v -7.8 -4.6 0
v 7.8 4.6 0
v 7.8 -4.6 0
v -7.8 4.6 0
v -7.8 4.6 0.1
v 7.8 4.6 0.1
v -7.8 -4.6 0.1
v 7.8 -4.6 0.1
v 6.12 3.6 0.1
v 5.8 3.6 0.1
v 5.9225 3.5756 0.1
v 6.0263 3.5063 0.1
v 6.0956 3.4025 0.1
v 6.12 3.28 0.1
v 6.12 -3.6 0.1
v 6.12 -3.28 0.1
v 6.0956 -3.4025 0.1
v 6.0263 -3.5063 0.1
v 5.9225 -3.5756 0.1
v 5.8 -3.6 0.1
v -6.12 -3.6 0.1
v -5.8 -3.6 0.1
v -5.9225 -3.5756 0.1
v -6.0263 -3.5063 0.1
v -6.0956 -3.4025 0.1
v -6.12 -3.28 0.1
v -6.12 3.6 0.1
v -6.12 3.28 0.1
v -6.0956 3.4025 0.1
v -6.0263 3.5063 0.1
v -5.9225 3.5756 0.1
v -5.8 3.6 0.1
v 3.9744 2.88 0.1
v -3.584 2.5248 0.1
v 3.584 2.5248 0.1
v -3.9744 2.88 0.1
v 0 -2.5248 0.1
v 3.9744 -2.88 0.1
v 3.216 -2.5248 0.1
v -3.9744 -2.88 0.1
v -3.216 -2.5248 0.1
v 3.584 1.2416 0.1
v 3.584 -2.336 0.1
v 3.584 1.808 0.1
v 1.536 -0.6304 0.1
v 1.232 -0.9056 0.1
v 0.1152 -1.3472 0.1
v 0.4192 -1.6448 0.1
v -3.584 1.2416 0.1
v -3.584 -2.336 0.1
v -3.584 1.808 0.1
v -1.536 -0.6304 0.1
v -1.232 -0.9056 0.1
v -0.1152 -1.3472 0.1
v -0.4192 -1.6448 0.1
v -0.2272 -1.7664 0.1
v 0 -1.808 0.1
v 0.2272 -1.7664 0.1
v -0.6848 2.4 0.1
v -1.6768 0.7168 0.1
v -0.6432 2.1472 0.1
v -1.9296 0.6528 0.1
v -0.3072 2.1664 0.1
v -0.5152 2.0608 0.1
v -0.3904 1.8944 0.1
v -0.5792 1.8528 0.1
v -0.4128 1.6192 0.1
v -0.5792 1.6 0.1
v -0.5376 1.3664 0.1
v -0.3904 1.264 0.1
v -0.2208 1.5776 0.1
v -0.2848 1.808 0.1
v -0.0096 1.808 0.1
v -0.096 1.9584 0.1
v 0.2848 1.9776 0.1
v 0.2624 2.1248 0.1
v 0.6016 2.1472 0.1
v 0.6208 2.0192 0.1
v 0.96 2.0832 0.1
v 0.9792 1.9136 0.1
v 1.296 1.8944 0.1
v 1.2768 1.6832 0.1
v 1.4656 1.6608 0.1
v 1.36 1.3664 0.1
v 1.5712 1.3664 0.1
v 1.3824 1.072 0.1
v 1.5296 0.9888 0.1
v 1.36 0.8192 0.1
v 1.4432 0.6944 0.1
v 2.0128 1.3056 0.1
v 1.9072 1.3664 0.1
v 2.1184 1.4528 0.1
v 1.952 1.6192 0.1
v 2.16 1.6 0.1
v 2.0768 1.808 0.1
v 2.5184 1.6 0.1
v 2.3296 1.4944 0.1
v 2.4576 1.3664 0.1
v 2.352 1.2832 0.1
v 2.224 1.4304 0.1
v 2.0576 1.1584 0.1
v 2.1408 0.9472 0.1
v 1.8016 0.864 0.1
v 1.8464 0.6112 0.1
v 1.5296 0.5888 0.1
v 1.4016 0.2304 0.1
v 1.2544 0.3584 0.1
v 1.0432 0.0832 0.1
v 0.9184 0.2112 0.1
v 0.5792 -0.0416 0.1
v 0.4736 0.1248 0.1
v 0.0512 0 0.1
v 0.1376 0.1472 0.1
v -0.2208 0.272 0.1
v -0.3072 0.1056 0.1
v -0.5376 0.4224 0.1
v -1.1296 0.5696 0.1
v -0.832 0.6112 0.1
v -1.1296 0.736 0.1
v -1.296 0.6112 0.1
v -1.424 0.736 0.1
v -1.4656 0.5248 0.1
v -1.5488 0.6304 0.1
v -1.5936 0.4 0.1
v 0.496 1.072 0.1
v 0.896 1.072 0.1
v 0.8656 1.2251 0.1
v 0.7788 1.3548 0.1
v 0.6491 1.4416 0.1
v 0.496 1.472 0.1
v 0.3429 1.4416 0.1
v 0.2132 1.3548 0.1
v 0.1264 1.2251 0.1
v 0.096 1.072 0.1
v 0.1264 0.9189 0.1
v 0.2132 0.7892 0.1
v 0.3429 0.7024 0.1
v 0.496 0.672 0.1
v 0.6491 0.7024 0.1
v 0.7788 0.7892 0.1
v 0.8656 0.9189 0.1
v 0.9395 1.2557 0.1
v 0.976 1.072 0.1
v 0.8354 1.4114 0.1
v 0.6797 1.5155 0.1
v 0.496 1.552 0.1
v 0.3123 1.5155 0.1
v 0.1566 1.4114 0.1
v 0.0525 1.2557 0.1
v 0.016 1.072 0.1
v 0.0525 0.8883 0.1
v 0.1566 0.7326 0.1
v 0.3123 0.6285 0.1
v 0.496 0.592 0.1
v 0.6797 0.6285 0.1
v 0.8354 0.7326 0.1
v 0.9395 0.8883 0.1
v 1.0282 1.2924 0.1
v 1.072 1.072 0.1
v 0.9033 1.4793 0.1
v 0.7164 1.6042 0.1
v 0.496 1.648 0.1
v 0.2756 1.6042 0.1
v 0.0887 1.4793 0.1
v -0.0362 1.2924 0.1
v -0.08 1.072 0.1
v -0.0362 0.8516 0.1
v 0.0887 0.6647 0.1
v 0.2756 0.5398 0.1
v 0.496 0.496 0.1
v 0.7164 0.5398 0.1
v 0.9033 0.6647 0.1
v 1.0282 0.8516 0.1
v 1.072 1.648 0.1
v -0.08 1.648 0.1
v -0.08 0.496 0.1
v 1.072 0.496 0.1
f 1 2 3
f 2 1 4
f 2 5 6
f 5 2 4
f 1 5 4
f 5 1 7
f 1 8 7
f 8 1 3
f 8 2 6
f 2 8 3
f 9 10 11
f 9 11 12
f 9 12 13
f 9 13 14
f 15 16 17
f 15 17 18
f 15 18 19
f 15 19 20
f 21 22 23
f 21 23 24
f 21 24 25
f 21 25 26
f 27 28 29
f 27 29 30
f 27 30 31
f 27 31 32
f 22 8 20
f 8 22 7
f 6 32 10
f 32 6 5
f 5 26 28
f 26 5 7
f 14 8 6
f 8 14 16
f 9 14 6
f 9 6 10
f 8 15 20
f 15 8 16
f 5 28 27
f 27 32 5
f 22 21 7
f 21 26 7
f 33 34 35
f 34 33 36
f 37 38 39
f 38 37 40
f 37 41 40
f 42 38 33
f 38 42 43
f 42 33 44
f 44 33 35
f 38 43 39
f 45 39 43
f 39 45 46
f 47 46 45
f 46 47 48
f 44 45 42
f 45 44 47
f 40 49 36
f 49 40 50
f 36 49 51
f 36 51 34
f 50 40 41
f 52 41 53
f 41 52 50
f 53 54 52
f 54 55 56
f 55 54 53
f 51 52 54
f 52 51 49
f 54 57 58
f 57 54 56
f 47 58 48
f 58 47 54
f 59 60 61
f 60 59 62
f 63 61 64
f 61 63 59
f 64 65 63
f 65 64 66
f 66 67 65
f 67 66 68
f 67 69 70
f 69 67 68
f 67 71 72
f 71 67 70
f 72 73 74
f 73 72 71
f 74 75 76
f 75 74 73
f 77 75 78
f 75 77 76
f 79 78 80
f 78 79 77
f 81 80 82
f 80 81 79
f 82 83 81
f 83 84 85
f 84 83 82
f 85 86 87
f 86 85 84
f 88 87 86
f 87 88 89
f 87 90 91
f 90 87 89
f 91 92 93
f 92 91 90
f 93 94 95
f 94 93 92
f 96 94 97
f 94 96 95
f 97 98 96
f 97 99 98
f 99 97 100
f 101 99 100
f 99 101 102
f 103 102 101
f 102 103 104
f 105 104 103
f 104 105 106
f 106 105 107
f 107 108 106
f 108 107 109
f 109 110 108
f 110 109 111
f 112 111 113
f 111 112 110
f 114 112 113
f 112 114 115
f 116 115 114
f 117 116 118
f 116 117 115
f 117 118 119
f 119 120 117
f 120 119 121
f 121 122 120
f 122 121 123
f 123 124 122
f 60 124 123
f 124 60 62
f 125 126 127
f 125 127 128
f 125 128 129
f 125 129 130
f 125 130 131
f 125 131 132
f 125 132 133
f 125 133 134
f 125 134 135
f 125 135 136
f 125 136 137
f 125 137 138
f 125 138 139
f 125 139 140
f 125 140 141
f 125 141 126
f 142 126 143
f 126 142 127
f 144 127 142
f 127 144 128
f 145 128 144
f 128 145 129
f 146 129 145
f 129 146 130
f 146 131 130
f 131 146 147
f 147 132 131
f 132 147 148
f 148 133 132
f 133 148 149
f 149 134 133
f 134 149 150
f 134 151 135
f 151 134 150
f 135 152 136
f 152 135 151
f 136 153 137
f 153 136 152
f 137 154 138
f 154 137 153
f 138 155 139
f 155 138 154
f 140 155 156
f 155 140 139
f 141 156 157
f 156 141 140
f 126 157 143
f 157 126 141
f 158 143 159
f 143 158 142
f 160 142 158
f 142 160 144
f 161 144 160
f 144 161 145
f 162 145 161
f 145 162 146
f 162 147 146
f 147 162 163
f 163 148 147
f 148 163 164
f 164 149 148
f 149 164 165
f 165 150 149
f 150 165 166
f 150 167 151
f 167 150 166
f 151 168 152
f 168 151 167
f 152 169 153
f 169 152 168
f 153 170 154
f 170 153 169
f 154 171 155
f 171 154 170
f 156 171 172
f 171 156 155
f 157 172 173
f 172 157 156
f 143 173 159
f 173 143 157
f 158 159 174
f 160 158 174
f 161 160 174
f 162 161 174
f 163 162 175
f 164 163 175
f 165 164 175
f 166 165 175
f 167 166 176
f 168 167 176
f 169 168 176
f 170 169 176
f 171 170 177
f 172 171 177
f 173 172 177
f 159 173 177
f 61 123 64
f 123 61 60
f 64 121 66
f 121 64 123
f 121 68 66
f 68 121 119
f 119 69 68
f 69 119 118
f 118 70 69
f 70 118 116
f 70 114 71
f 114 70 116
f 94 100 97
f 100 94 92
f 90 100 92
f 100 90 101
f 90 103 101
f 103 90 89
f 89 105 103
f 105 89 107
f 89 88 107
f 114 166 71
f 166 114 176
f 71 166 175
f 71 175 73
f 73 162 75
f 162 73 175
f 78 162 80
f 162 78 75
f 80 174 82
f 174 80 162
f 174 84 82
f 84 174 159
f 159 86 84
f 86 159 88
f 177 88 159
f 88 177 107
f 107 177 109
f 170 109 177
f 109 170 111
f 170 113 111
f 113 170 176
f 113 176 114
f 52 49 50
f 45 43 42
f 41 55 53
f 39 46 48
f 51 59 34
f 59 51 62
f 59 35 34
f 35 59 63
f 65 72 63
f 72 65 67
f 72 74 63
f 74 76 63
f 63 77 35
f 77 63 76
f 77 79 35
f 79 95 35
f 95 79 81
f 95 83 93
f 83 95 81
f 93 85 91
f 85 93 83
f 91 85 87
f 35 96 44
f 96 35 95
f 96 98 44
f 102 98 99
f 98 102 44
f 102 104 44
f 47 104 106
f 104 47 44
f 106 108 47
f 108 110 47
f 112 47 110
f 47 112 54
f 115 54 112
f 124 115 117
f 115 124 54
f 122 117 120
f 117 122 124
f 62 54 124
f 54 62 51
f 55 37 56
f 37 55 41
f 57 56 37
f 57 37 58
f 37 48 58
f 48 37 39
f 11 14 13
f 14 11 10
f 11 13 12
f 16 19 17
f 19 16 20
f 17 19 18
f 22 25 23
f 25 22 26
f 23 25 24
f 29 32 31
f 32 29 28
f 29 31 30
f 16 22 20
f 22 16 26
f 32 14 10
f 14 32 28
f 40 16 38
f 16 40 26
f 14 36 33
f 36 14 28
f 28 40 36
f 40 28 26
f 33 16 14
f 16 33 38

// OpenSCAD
// file: ../p/4-4ring5.scad
use <../lib.scad>
function ldraw_lib__4_4ring5() = [
// 0 Ring  5 x 1.0
// 0 Name: 4-4ring5.dat
// 0 Author: Mark Kennedy [mkennedy]
// 0 !LDRAW_ORG Primitive UPDATE 2025-01
// 0 !LICENSE Licensed under CC BY 4.0 : see CAreadme.txt
// 
// 0 BFC CERTIFY CCW
  [0,"BFC","CERTIFY"],
  [0,"BFC","CCW"],
// 
// 0 !HISTORY 2001-10-23 [pneaster] resequenced quads, corrected winding.
// 0 !HISTORY 2001-12-29 [pneaster] Added BFC.
// 0 !HISTORY 2002-04-25 [PTadmin] Official Update 2002-02
// 0 !HISTORY 2007-06-24 [PTadmin] Header formatted for Contributor Agreement
// 0 !HISTORY 2008-07-01 [PTadmin] Official Update 2008-01
// 0 !HISTORY 2012-02-16 [Philo] Changed to CCW
// 0 !HISTORY 2012-03-30 [PTadmin] Official Update 2012-01
// 0 !HISTORY 2024-12-30 [MagFors] Recreated using PrimGen
// 0 !HISTORY 2025-01-20 [OrionP] Official Update 2025-01
// 
// 4 16 6 0 0 5.5434 0 2.2962 4.6195 0 1.9135 5 0 0
  [4,16,6,0,0,5.5434,0,2.2962,4.6195,0,1.9135,5,0,0],
// 4 16 5.5434 0 2.2962 4.2426 0 4.2426 3.5355 0 3.5355 4.6195 0 1.9135
  [4,16,5.5434,0,2.2962,4.2426,0,4.2426,3.5355,0,3.5355,4.6195,0,1.9135],
// 4 16 4.2426 0 4.2426 2.2962 0 5.5434 1.9135 0 4.6195 3.5355 0 3.5355
  [4,16,4.2426,0,4.2426,2.2962,0,5.5434,1.9135,0,4.6195,3.5355,0,3.5355],
// 4 16 2.2962 0 5.5434 0 0 6 0 0 5 1.9135 0 4.6195
  [4,16,2.2962,0,5.5434,0,0,6,0,0,5,1.9135,0,4.6195],
// 4 16 0 0 6 -2.2962 0 5.5434 -1.9135 0 4.6195 0 0 5
  [4,16,0,0,6,-2.2962,0,5.5434,-1.9135,0,4.6195,0,0,5],
// 4 16 -2.2962 0 5.5434 -4.2426 0 4.2426 -3.5355 0 3.5355 -1.9135 0 4.6195
  [4,16,-2.2962,0,5.5434,-4.2426,0,4.2426,-3.5355,0,3.5355,-1.9135,0,4.6195],
// 4 16 -4.2426 0 4.2426 -5.5434 0 2.2962 -4.6195 0 1.9135 -3.5355 0 3.5355
  [4,16,-4.2426,0,4.2426,-5.5434,0,2.2962,-4.6195,0,1.9135,-3.5355,0,3.5355],
// 4 16 -5.5434 0 2.2962 -6 0 0 -5 0 0 -4.6195 0 1.9135
  [4,16,-5.5434,0,2.2962,-6,0,0,-5,0,0,-4.6195,0,1.9135],
// 4 16 -6 0 0 -5.5434 0 -2.2962 -4.6195 0 -1.9135 -5 0 0
  [4,16,-6,0,0,-5.5434,0,-2.2962,-4.6195,0,-1.9135,-5,0,0],
// 4 16 -5.5434 0 -2.2962 -4.2426 0 -4.2426 -3.5355 0 -3.5355 -4.6195 0 -1.9135
  [4,16,-5.5434,0,-2.2962,-4.2426,0,-4.2426,-3.5355,0,-3.5355,-4.6195,0,-1.9135],
// 4 16 -4.2426 0 -4.2426 -2.2962 0 -5.5434 -1.9135 0 -4.6195 -3.5355 0 -3.5355
  [4,16,-4.2426,0,-4.2426,-2.2962,0,-5.5434,-1.9135,0,-4.6195,-3.5355,0,-3.5355],
// 4 16 -2.2962 0 -5.5434 0 0 -6 0 0 -5 -1.9135 0 -4.6195
  [4,16,-2.2962,0,-5.5434,0,0,-6,0,0,-5,-1.9135,0,-4.6195],
// 4 16 0 0 -6 2.2962 0 -5.5434 1.9135 0 -4.6195 0 0 -5
  [4,16,0,0,-6,2.2962,0,-5.5434,1.9135,0,-4.6195,0,0,-5],
// 4 16 2.2962 0 -5.5434 4.2426 0 -4.2426 3.5355 0 -3.5355 1.9135 0 -4.6195
  [4,16,2.2962,0,-5.5434,4.2426,0,-4.2426,3.5355,0,-3.5355,1.9135,0,-4.6195],
// 4 16 4.2426 0 -4.2426 5.5434 0 -2.2962 4.6195 0 -1.9135 3.5355 0 -3.5355
  [4,16,4.2426,0,-4.2426,5.5434,0,-2.2962,4.6195,0,-1.9135,3.5355,0,-3.5355],
// 4 16 5.5434 0 -2.2962 6 0 0 5 0 0 4.6195 0 -1.9135
  [4,16,5.5434,0,-2.2962,6,0,0,5,0,0,4.6195,0,-1.9135],
// 0 // Build by LDPartEditor (PrimGen 2.X)
];
module ldraw_lib__4_4ring5(step=0, col=false, unit=2/5, alt=false, line=0.2, solid=!$preview)
    makepoly(ldraw_lib__4_4ring5(), step=step, col=col, unit=unit, alt=alt, line=line, solid=solid);
ldraw_lib__4_4ring5(line=0.2);
// file: ../p/4-4ndis.scad
use <../lib.scad>
function ldraw_lib__4_4ndis() = [
// 0 Disc Negative 1.0
// 0 Name: 4-4ndis.dat
// 0 Author: James Jessiman
// 0 !LDRAW_ORG Primitive UPDATE 2012-01
// 0 !LICENSE Licensed under CC BY 4.0 : see CAreadme.txt
// 
// 0 BFC CERTIFY CCW
  [0,"BFC","CERTIFY"],
  [0,"BFC","CCW"],
// 
// 0 !HISTORY 2002-03-23 [sbliss] Added BFC statement; compacted code
// 0 !HISTORY 2002-04-25 [PTadmin] Official Update 2002-02
// 0 !HISTORY 2007-06-24 [PTadmin] Header formatted for Contributor Agreement
// 0 !HISTORY 2008-07-01 [PTadmin] Official Update 2008-01
// 0 !HISTORY 2012-02-16 [Philo] Changed to CCW
// 0 !HISTORY 2012-03-30 [PTadmin] Official Update 2012-01
// 
// 
// 3 16 0.9239 0 0.3827 1 0 0 1 0 1
  [3,16,0.9239,0,0.3827,1,0,0,1,0,1],
// 3 16 0.7071 0 0.7071 0.9239 0 0.3827 1 0 1
  [3,16,0.7071,0,0.7071,0.9239,0,0.3827,1,0,1],
// 3 16 0.3827 0 0.9239 0.7071 0 0.7071 1 0 1
  [3,16,0.3827,0,0.9239,0.7071,0,0.7071,1,0,1],
// 3 16 0 0 1 0.3827 0 0.9239 1 0 1
  [3,16,0,0,1,0.3827,0,0.9239,1,0,1],
// 3 16 -0.3827 0 0.9239 0 0 1 -1 0 1
  [3,16,-0.3827,0,0.9239,0,0,1,-1,0,1],
// 3 16 -0.7071 0 0.7071 -0.3827 0 0.9239 -1 0 1
  [3,16,-0.7071,0,0.7071,-0.3827,0,0.9239,-1,0,1],
// 3 16 -0.9239 0 0.3827 -0.7071 0 0.7071 -1 0 1
  [3,16,-0.9239,0,0.3827,-0.7071,0,0.7071,-1,0,1],
// 3 16 -1 0 0 -0.9239 0 0.3827 -1 0 1
  [3,16,-1,0,0,-0.9239,0,0.3827,-1,0,1],
// 3 16 -0.9239 0 -0.3827 -1 0 0 -1 0 -1
  [3,16,-0.9239,0,-0.3827,-1,0,0,-1,0,-1],
// 3 16 -0.7071 0 -0.7071 -0.9239 0 -0.3827 -1 0 -1
  [3,16,-0.7071,0,-0.7071,-0.9239,0,-0.3827,-1,0,-1],
// 3 16 -0.3827 0 -0.9239 -0.7071 0 -0.7071 -1 0 -1
  [3,16,-0.3827,0,-0.9239,-0.7071,0,-0.7071,-1,0,-1],
// 3 16 0 0 -1 -0.3827 0 -0.9239 -1 0 -1
  [3,16,0,0,-1,-0.3827,0,-0.9239,-1,0,-1],
// 3 16 0.3827 0 -0.9239 0 0 -1 1 0 -1
  [3,16,0.3827,0,-0.9239,0,0,-1,1,0,-1],
// 3 16 0.7071 0 -0.7071 0.3827 0 -0.9239 1 0 -1
  [3,16,0.7071,0,-0.7071,0.3827,0,-0.9239,1,0,-1],
// 3 16 0.9239 0 -0.3827 0.7071 0 -0.7071 1 0 -1
  [3,16,0.9239,0,-0.3827,0.7071,0,-0.7071,1,0,-1],
// 3 16 1 0 0 0.9239 0 -0.3827 1 0 -1
  [3,16,1,0,0,0.9239,0,-0.3827,1,0,-1],
];
module ldraw_lib__4_4ndis(step=0, col=false, unit=2/5, alt=false, line=0.2, solid=!$preview)
    makepoly(ldraw_lib__4_4ndis(), step=step, col=col, unit=unit, alt=alt, line=line, solid=solid);
ldraw_lib__4_4ndis(line=0.2);
// file: ../p/4-4disc.scad
use <../lib.scad>
function ldraw_lib__4_4disc() = [
// 0 Disc 1.0
// 0 Name: 4-4disc.dat
// 0 Author: James Jessiman
// 0 !LDRAW_ORG Primitive UPDATE 2002-02
// 0 !LICENSE Licensed under CC BY 4.0 : see CAreadme.txt
// 
// 0 BFC CERTIFY CCW
  [0,"BFC","CERTIFY"],
  [0,"BFC","CCW"],
// 
// 0 !HISTORY 1998-12-15 [PTadmin] Official Update 1998-10
// 0 !HISTORY 2002-03-23 [sbliss] Added BFC statement
// 0 !HISTORY 2002-04-25 [PTadmin] Official Update 2002-02
// 0 !HISTORY 2007-06-24 [PTadmin] Header formatted for Contributor Agreement
// 0 !HISTORY 2008-07-01 [PTadmin] Official Update 2008-01
// 
// 
// 3 16 0 0 0 1 0 0 0.9239 0 0.3827
  [3,16,0,0,0,1,0,0,0.9239,0,0.3827],
// 3 16 0 0 0 0.9239 0 0.3827 0.7071 0 0.7071
  [3,16,0,0,0,0.9239,0,0.3827,0.7071,0,0.7071],
// 3 16 0 0 0 0.7071 0 0.7071 0.3827 0 0.9239
  [3,16,0,0,0,0.7071,0,0.7071,0.3827,0,0.9239],
// 3 16 0 0 0 0.3827 0 0.9239 0 0 1
  [3,16,0,0,0,0.3827,0,0.9239,0,0,1],
// 3 16 0 0 0 0 0 1 -0.3827 0 0.9239
  [3,16,0,0,0,0,0,1,-0.3827,0,0.9239],
// 3 16 0 0 0 -0.3827 0 0.9239 -0.7071 0 0.7071
  [3,16,0,0,0,-0.3827,0,0.9239,-0.7071,0,0.7071],
// 3 16 0 0 0 -0.7071 0 0.7071 -0.9239 0 0.3827
  [3,16,0,0,0,-0.7071,0,0.7071,-0.9239,0,0.3827],
// 3 16 0 0 0 -0.9239 0 0.3827 -1 0 -0
  [3,16,0,0,0,-0.9239,0,0.3827,-1,0,-0],
// 3 16 0 0 0 -1 0 -0 -0.9239 0 -0.3827
  [3,16,0,0,0,-1,0,-0,-0.9239,0,-0.3827],
// 3 16 0 0 0 -0.9239 0 -0.3827 -0.7071 0 -0.7071
  [3,16,0,0,0,-0.9239,0,-0.3827,-0.7071,0,-0.7071],
// 3 16 0 0 0 -0.7071 0 -0.7071 -0.3827 0 -0.9239
  [3,16,0,0,0,-0.7071,0,-0.7071,-0.3827,0,-0.9239],
// 3 16 0 0 0 -0.3827 0 -0.9239 0 0 -1
  [3,16,0,0,0,-0.3827,0,-0.9239,0,0,-1],
// 3 16 0 0 0 0 0 -1 0.3827 0 -0.9239
  [3,16,0,0,0,0,0,-1,0.3827,0,-0.9239],
// 3 16 0 0 0 0.3827 0 -0.9239 0.7071 0 -0.7071
  [3,16,0,0,0,0.3827,0,-0.9239,0.7071,0,-0.7071],
// 3 16 0 0 0 0.7071 0 -0.7071 0.9239 0 -0.3827
  [3,16,0,0,0,0.7071,0,-0.7071,0.9239,0,-0.3827],
// 3 16 0 0 0 0.9239 0 -0.3827 1 0 0
  [3,16,0,0,0,0.9239,0,-0.3827,1,0,0],
// 0
];
module ldraw_lib__4_4disc(step=0, col=false, unit=2/5, alt=false, line=0.2, solid=!$preview)
    makepoly(ldraw_lib__4_4disc(), step=step, col=col, unit=unit, alt=alt, line=line, solid=solid);
ldraw_lib__4_4disc(line=0.2);
// file: ../p/box5-12.scad
use <../lib.scad>
function ldraw_lib__box5_12() = [
// 0 Box with 5 Faces without Any Edges
// 0 Name: box5-12.dat
// 0 Author: Chris Dee [cwdee]
// 0 !LDRAW_ORG Primitive UPDATE 2009-02
// 0 !LICENSE Licensed under CC BY 4.0 : see CAreadme.txt
// 
// 0 BFC CERTIFY CCW
  [0,"BFC","CERTIFY"],
  [0,"BFC","CCW"],
// 
// 0 !HISTORY 2009-09-03 [PTadmin] Official Update 2009-02
// 
// 
// 4 16 1 1 1 1 1 -1 -1 1 -1 -1 1 1
  [4,16,1,1,1,1,1,-1,-1,1,-1,-1,1,1],
// 4 16 -1 0 1 1 0 1 1 1 1 -1 1 1
  [4,16,-1,0,1,1,0,1,1,1,1,-1,1,1],
// 4 16 -1 0 -1 -1 0 1 -1 1 1 -1 1 -1
  [4,16,-1,0,-1,-1,0,1,-1,1,1,-1,1,-1],
// 4 16 1 0 -1 -1 0 -1 -1 1 -1 1 1 -1
  [4,16,1,0,-1,-1,0,-1,-1,1,-1,1,1,-1],
// 4 16 1 0 1 1 0 -1 1 1 -1 1 1 1
  [4,16,1,0,1,1,0,-1,1,1,-1,1,1,1],
// 0
];
module ldraw_lib__box5_12(step=0, col=false, unit=2/5, alt=false, line=0.2, solid=!$preview)
    makepoly(ldraw_lib__box5_12(), step=step, col=col, unit=unit, alt=alt, line=line, solid=solid);
ldraw_lib__box5_12(line=0.2);
// file: ../p/1-4ndis.scad
use <../lib.scad>
function ldraw_lib__1_4ndis() = [
// 0 Disc Negative 0.25
// 0 Name: 1-4ndis.dat
// 0 Author: James Jessiman
// 0 !LDRAW_ORG Primitive UPDATE 2012-01
// 0 !LICENSE Licensed under CC BY 4.0 : see CAreadme.txt
// 
// 0 BFC CERTIFY CCW
  [0,"BFC","CERTIFY"],
  [0,"BFC","CCW"],
// 
// 0 !HISTORY 2002-03-23 [sbliss] Added BFC Statement
// 0 !HISTORY 2002-04-25 [PTadmin] Official Update 2002-02
// 0 !HISTORY 2007-06-22 [PTadmin] Header formatted for Contributor Agreement
// 0 !HISTORY 2008-07-01 [PTadmin] Official Update 2008-01
// 0 !HISTORY 2012-02-16 [Philo] Changed to CCW
// 0 !HISTORY 2012-03-30 [PTadmin] Official Update 2012-01
// 
// 
// 3 16 0.9239 0 0.3827 1 0 0 1 0 1
  [3,16,0.9239,0,0.3827,1,0,0,1,0,1],
// 3 16 0.7071 0 0.7071 0.9239 0 0.3827 1 0 1
  [3,16,0.7071,0,0.7071,0.9239,0,0.3827,1,0,1],
// 3 16 0.3827 0 0.9239 0.7071 0 0.7071 1 0 1
  [3,16,0.3827,0,0.9239,0.7071,0,0.7071,1,0,1],
// 3 16 0 0 1 0.3827 0 0.9239 1 0 1
  [3,16,0,0,1,0.3827,0,0.9239,1,0,1],
];
module ldraw_lib__1_4ndis(step=0, col=false, unit=2/5, alt=false, line=0.2, solid=!$preview)
    makepoly(ldraw_lib__1_4ndis(), step=step, col=col, unit=unit, alt=alt, line=line, solid=solid);
ldraw_lib__1_4ndis(line=0.2);
// file: ../p/1-4chrd.scad
use <../lib.scad>
function ldraw_lib__1_4chrd() = [
// 0 Chord 0.25
// 0 Name: 1-4chrd.dat
// 0 Author: Max Martin Richter [MMR1988]
// 0 !LDRAW_ORG Primitive UPDATE 2023-05
// 0 !LICENSE Licensed under CC BY 4.0 : see CAreadme.txt
// 
// 0 BFC CERTIFY CCW
  [0,"BFC","CERTIFY"],
  [0,"BFC","CCW"],
// 
// 0 !HISTORY 2004-04-22 [PTadmin] Official Update 2004-02
// 0 !HISTORY 2007-10-09 [PTadmin] Header formatted for Contributor Agreement
// 0 !HISTORY 2008-07-01 [PTadmin] Official Update 2008-01
// 0 !HISTORY 2012-08-02 [MMR1988] Re-creation with PrimGen2 and Rectifier
// 0 !HISTORY 2012-08-09 [PTadmin] Official Update 2012-02
// 0 !HISTORY 2023-10-27 [OrionP] Change author to MMR1988 from hafhead
// 0 !HISTORY 2023-10-31 [OrionP] Official Update 2023-05
// 
// 4 16 0.9239 0 0.3827 0.3827 0 0.9239 0 0 1 1 0 0
  [4,16,0.9239,0,0.3827,0.3827,0,0.9239,0,0,1,1,0,0],
// 3 16 0.7071 0 0.7071 0.3827 0 0.9239 0.9239 0 0.3827
  [3,16,0.7071,0,0.7071,0.3827,0,0.9239,0.9239,0,0.3827],
];
module ldraw_lib__1_4chrd(step=0, col=false, unit=2/5, alt=false, line=0.2, solid=!$preview)
    makepoly(ldraw_lib__1_4chrd(), step=step, col=col, unit=unit, alt=alt, line=line, solid=solid);
ldraw_lib__1_4chrd(line=0.2);
// main file
use <../lib.scad>
use <../p/1-4chrd.scad>
use <../p/1-4ndis.scad>
use <../p/box5-12.scad>
use <s/4346p03b.scad>
function ldraw_lib__168225e() = [
// 0 Sticker  1.1 x  1.9 with Envelope and Post Horn on Red Background
// 0 Name: 168225e.dat
// 0 Author: Ulrich Röder [UR]
// 0 !LDRAW_ORG Part UPDATE 2024-11
// 0 !LICENSE Licensed under CC BY 4.0 : see CAreadme.txt
// 
// 0 BFC CERTIFY CCW
  [0,"BFC","CERTIFY"],
  [0,"BFC","CCW"],
// 
// 0 !KEYWORDS set 4564
// 
// 0 !HISTORY 2024-05-27 [GeraldLasser] Move BFC NOCLIP, adjusted Background Color
// 0 !HISTORY 2024-12-30 [OrionP] Official Update 2024-11
// 
// 0 // Body/Main
// 1 16 0 -0.25 0 19.5 0 0 0 0.25 0 0 0 11.5 box5-12.dat
  [1,16,0,-0.25,0,19.5,0,0,0,0.25,0,0,0,11.5, ldraw_lib__box5_12()],
// 
// 1 16 14.5 -.25 8.2 0 0 .8 0 1 0 .8 0 0 1-4ndis.dat
  [1,16,14.5,-.25,8.2,0,0,.8,0,1,0,.8,0,0, ldraw_lib__1_4ndis()],
// 1 16 14.5 -.25 -8.2 .8 0 0 0 1 0 0 0 -.8 1-4ndis.dat
  [1,16,14.5,-.25,-8.2,.8,0,0,0,1,0,0,0,-.8, ldraw_lib__1_4ndis()],
// 1 16 -14.5 -.25 -8.2 0 0 -.8 0 1 0 -.8 0 0 1-4ndis.dat
  [1,16,-14.5,-.25,-8.2,0,0,-.8,0,1,0,-.8,0,0, ldraw_lib__1_4ndis()],
// 1 16 -14.5 -.25 8.2 -.8 0 0 0 1 0 0 0 .8 1-4ndis.dat
  [1,16,-14.5,-.25,8.2,-.8,0,0,0,1,0,0,0,.8, ldraw_lib__1_4ndis()],
// 4 16 19.5 -.25 -11.5 14.5 -.25 -9 -14.5 -.25 -9 -19.5 -.25 -11.5
  [4,16,19.5,-.25,-11.5,14.5,-.25,-9,-14.5,-.25,-9,-19.5,-.25,-11.5],
// 4 16 14.5 -.25 9 19.5 -.25 11.5 -19.5 -.25 11.5 -14.5 -.25 9
  [4,16,14.5,-.25,9,19.5,-.25,11.5,-19.5,-.25,11.5,-14.5,-.25,9],
// 4 16 -19.5 -.25 11.5 -19.5 -.25 -11.5 -15.3 -.25 -8.2 -15.3 -.25 8.2
  [4,16,-19.5,-.25,11.5,-19.5,-.25,-11.5,-15.3,-.25,-8.2,-15.3,-.25,8.2],
// 4 16 15.3 -.25 8.2 15.3 -.25 -8.2 19.5 -.25 -11.5 19.5 -.25 11.5
  [4,16,15.3,-.25,8.2,15.3,-.25,-8.2,19.5,-.25,-11.5,19.5,-.25,11.5],
// 3 16 15.3 -.25 9 15.3 -.25 8.2 19.5 -.25 11.5
  [3,16,15.3,-.25,9,15.3,-.25,8.2,19.5,-.25,11.5],
// 3 16 15.3 -.25 9 19.5 -.25 11.5 14.5 -.25 9
  [3,16,15.3,-.25,9,19.5,-.25,11.5,14.5,-.25,9],
// 3 16 19.5 -.25 -11.5 15.3 -.25 -9 14.5 -.25 -9
  [3,16,19.5,-.25,-11.5,15.3,-.25,-9,14.5,-.25,-9],
// 3 16 15.3 -.25 -9 19.5 -.25 -11.5 15.3 -.25 -8.2
  [3,16,15.3,-.25,-9,19.5,-.25,-11.5,15.3,-.25,-8.2],
// 3 16 -19.5 -.25 11.5 -15.3 -.25 8.2 -15.3 -.25 9
  [3,16,-19.5,-.25,11.5,-15.3,-.25,8.2,-15.3,-.25,9],
// 3 16 -15.3 -.25 9 -14.5 -.25 9 -19.5 -.25 11.5
  [3,16,-15.3,-.25,9,-14.5,-.25,9,-19.5,-.25,11.5],
// 3 16 -14.5 -.25 -9 -15.3 -.25 -9 -19.5 -.25 -11.5
  [3,16,-14.5,-.25,-9,-15.3,-.25,-9,-19.5,-.25,-11.5],
// 3 16 -15.3 -.25 -9 -15.3 -.25 -8.2 -19.5 -.25 -11.5
  [3,16,-15.3,-.25,-9,-15.3,-.25,-8.2,-19.5,-.25,-11.5],
// 
// 0 BFC NOCLIP
  [0,"BFC","NOCLIP"],
// 0 // Frontface
// 1 15 0 -.25 0 .8 0 0 0 1 0 0 0 .8 s\4346p03b.dat
  [1,15,0,-.25,0,.8,0,0,0,1,0,0,0,.8, ldraw_lib__s__4346p03b()],
// 1 4 14.5 -.25 8.2 0 0 .8 0 1 0 .8 0 0 1-4chrd.dat
  [1,4,14.5,-.25,8.2,0,0,.8,0,1,0,.8,0,0, ldraw_lib__1_4chrd()],
// 1 4 14.5 -.25 -8.2 .8 0 0 0 1 0 0 0 -.8 1-4chrd.dat
  [1,4,14.5,-.25,-8.2,.8,0,0,0,1,0,0,0,-.8, ldraw_lib__1_4chrd()],
// 1 4 -14.5 -.25 -8.2 0 0 -.8 0 1 0 -.8 0 0 1-4chrd.dat
  [1,4,-14.5,-.25,-8.2,0,0,-.8,0,1,0,-.8,0,0, ldraw_lib__1_4chrd()],
// 1 4 -14.5 -.25 8.2 -.8 0 0 0 1 0 0 0 .8 1-4chrd.dat
  [1,4,-14.5,-.25,8.2,-.8,0,0,0,1,0,0,0,.8, ldraw_lib__1_4chrd()],
// 4 4 -15.3 -.25 -8.2 -14.5 -.25 -9 14.5 -.25 -9 15.3 -.25 -8.2
  [4,4,-15.3,-.25,-8.2,-14.5,-.25,-9,14.5,-.25,-9,15.3,-.25,-8.2],
// 4 4 -14.5 -.25 9 -15.3 -.25 8.2 15.3 -.25 8.2 14.5 -.25 9
  [4,4,-14.5,-.25,9,-15.3,-.25,8.2,15.3,-.25,8.2,14.5,-.25,9],
// 4 4 -9.936 -.25 -7.2 -15.3 -.25 -8.2 15.3 -.25 -8.2 9.936 -.25 -7.2
  [4,4,-9.936,-.25,-7.2,-15.3,-.25,-8.2,15.3,-.25,-8.2,9.936,-.25,-7.2],
// 4 4 -15.3 -.25 8.2 -9.936 -.25 7.2 9.936 -.25 7.2 15.3 -.25 8.2
  [4,4,-15.3,-.25,8.2,-9.936,-.25,7.2,9.936,-.25,7.2,15.3,-.25,8.2],
// 4 4 -15.3 -.25 8.2 -15.3 -.25 -8.2 -9.936 -.25 -7.2 -9.936 -.25 7.2
  [4,4,-15.3,-.25,8.2,-15.3,-.25,-8.2,-9.936,-.25,-7.2,-9.936,-.25,7.2],
// 4 4 9.936 -.25 7.2 9.936 -.25 -7.2 15.3 -.25 -8.2 15.3 -.25 8.2
  [4,4,9.936,-.25,7.2,9.936,-.25,-7.2,15.3,-.25,-8.2,15.3,-.25,8.2],
];
module ldraw_lib__168225e(step=0, col=false, unit=2/5, alt=false, line=0.2, solid=!$preview)
    makepoly(ldraw_lib__168225e(), step=step, col=col, unit=unit, alt=alt, line=line, solid=solid);
ldraw_lib__168225e(line=0.2);
